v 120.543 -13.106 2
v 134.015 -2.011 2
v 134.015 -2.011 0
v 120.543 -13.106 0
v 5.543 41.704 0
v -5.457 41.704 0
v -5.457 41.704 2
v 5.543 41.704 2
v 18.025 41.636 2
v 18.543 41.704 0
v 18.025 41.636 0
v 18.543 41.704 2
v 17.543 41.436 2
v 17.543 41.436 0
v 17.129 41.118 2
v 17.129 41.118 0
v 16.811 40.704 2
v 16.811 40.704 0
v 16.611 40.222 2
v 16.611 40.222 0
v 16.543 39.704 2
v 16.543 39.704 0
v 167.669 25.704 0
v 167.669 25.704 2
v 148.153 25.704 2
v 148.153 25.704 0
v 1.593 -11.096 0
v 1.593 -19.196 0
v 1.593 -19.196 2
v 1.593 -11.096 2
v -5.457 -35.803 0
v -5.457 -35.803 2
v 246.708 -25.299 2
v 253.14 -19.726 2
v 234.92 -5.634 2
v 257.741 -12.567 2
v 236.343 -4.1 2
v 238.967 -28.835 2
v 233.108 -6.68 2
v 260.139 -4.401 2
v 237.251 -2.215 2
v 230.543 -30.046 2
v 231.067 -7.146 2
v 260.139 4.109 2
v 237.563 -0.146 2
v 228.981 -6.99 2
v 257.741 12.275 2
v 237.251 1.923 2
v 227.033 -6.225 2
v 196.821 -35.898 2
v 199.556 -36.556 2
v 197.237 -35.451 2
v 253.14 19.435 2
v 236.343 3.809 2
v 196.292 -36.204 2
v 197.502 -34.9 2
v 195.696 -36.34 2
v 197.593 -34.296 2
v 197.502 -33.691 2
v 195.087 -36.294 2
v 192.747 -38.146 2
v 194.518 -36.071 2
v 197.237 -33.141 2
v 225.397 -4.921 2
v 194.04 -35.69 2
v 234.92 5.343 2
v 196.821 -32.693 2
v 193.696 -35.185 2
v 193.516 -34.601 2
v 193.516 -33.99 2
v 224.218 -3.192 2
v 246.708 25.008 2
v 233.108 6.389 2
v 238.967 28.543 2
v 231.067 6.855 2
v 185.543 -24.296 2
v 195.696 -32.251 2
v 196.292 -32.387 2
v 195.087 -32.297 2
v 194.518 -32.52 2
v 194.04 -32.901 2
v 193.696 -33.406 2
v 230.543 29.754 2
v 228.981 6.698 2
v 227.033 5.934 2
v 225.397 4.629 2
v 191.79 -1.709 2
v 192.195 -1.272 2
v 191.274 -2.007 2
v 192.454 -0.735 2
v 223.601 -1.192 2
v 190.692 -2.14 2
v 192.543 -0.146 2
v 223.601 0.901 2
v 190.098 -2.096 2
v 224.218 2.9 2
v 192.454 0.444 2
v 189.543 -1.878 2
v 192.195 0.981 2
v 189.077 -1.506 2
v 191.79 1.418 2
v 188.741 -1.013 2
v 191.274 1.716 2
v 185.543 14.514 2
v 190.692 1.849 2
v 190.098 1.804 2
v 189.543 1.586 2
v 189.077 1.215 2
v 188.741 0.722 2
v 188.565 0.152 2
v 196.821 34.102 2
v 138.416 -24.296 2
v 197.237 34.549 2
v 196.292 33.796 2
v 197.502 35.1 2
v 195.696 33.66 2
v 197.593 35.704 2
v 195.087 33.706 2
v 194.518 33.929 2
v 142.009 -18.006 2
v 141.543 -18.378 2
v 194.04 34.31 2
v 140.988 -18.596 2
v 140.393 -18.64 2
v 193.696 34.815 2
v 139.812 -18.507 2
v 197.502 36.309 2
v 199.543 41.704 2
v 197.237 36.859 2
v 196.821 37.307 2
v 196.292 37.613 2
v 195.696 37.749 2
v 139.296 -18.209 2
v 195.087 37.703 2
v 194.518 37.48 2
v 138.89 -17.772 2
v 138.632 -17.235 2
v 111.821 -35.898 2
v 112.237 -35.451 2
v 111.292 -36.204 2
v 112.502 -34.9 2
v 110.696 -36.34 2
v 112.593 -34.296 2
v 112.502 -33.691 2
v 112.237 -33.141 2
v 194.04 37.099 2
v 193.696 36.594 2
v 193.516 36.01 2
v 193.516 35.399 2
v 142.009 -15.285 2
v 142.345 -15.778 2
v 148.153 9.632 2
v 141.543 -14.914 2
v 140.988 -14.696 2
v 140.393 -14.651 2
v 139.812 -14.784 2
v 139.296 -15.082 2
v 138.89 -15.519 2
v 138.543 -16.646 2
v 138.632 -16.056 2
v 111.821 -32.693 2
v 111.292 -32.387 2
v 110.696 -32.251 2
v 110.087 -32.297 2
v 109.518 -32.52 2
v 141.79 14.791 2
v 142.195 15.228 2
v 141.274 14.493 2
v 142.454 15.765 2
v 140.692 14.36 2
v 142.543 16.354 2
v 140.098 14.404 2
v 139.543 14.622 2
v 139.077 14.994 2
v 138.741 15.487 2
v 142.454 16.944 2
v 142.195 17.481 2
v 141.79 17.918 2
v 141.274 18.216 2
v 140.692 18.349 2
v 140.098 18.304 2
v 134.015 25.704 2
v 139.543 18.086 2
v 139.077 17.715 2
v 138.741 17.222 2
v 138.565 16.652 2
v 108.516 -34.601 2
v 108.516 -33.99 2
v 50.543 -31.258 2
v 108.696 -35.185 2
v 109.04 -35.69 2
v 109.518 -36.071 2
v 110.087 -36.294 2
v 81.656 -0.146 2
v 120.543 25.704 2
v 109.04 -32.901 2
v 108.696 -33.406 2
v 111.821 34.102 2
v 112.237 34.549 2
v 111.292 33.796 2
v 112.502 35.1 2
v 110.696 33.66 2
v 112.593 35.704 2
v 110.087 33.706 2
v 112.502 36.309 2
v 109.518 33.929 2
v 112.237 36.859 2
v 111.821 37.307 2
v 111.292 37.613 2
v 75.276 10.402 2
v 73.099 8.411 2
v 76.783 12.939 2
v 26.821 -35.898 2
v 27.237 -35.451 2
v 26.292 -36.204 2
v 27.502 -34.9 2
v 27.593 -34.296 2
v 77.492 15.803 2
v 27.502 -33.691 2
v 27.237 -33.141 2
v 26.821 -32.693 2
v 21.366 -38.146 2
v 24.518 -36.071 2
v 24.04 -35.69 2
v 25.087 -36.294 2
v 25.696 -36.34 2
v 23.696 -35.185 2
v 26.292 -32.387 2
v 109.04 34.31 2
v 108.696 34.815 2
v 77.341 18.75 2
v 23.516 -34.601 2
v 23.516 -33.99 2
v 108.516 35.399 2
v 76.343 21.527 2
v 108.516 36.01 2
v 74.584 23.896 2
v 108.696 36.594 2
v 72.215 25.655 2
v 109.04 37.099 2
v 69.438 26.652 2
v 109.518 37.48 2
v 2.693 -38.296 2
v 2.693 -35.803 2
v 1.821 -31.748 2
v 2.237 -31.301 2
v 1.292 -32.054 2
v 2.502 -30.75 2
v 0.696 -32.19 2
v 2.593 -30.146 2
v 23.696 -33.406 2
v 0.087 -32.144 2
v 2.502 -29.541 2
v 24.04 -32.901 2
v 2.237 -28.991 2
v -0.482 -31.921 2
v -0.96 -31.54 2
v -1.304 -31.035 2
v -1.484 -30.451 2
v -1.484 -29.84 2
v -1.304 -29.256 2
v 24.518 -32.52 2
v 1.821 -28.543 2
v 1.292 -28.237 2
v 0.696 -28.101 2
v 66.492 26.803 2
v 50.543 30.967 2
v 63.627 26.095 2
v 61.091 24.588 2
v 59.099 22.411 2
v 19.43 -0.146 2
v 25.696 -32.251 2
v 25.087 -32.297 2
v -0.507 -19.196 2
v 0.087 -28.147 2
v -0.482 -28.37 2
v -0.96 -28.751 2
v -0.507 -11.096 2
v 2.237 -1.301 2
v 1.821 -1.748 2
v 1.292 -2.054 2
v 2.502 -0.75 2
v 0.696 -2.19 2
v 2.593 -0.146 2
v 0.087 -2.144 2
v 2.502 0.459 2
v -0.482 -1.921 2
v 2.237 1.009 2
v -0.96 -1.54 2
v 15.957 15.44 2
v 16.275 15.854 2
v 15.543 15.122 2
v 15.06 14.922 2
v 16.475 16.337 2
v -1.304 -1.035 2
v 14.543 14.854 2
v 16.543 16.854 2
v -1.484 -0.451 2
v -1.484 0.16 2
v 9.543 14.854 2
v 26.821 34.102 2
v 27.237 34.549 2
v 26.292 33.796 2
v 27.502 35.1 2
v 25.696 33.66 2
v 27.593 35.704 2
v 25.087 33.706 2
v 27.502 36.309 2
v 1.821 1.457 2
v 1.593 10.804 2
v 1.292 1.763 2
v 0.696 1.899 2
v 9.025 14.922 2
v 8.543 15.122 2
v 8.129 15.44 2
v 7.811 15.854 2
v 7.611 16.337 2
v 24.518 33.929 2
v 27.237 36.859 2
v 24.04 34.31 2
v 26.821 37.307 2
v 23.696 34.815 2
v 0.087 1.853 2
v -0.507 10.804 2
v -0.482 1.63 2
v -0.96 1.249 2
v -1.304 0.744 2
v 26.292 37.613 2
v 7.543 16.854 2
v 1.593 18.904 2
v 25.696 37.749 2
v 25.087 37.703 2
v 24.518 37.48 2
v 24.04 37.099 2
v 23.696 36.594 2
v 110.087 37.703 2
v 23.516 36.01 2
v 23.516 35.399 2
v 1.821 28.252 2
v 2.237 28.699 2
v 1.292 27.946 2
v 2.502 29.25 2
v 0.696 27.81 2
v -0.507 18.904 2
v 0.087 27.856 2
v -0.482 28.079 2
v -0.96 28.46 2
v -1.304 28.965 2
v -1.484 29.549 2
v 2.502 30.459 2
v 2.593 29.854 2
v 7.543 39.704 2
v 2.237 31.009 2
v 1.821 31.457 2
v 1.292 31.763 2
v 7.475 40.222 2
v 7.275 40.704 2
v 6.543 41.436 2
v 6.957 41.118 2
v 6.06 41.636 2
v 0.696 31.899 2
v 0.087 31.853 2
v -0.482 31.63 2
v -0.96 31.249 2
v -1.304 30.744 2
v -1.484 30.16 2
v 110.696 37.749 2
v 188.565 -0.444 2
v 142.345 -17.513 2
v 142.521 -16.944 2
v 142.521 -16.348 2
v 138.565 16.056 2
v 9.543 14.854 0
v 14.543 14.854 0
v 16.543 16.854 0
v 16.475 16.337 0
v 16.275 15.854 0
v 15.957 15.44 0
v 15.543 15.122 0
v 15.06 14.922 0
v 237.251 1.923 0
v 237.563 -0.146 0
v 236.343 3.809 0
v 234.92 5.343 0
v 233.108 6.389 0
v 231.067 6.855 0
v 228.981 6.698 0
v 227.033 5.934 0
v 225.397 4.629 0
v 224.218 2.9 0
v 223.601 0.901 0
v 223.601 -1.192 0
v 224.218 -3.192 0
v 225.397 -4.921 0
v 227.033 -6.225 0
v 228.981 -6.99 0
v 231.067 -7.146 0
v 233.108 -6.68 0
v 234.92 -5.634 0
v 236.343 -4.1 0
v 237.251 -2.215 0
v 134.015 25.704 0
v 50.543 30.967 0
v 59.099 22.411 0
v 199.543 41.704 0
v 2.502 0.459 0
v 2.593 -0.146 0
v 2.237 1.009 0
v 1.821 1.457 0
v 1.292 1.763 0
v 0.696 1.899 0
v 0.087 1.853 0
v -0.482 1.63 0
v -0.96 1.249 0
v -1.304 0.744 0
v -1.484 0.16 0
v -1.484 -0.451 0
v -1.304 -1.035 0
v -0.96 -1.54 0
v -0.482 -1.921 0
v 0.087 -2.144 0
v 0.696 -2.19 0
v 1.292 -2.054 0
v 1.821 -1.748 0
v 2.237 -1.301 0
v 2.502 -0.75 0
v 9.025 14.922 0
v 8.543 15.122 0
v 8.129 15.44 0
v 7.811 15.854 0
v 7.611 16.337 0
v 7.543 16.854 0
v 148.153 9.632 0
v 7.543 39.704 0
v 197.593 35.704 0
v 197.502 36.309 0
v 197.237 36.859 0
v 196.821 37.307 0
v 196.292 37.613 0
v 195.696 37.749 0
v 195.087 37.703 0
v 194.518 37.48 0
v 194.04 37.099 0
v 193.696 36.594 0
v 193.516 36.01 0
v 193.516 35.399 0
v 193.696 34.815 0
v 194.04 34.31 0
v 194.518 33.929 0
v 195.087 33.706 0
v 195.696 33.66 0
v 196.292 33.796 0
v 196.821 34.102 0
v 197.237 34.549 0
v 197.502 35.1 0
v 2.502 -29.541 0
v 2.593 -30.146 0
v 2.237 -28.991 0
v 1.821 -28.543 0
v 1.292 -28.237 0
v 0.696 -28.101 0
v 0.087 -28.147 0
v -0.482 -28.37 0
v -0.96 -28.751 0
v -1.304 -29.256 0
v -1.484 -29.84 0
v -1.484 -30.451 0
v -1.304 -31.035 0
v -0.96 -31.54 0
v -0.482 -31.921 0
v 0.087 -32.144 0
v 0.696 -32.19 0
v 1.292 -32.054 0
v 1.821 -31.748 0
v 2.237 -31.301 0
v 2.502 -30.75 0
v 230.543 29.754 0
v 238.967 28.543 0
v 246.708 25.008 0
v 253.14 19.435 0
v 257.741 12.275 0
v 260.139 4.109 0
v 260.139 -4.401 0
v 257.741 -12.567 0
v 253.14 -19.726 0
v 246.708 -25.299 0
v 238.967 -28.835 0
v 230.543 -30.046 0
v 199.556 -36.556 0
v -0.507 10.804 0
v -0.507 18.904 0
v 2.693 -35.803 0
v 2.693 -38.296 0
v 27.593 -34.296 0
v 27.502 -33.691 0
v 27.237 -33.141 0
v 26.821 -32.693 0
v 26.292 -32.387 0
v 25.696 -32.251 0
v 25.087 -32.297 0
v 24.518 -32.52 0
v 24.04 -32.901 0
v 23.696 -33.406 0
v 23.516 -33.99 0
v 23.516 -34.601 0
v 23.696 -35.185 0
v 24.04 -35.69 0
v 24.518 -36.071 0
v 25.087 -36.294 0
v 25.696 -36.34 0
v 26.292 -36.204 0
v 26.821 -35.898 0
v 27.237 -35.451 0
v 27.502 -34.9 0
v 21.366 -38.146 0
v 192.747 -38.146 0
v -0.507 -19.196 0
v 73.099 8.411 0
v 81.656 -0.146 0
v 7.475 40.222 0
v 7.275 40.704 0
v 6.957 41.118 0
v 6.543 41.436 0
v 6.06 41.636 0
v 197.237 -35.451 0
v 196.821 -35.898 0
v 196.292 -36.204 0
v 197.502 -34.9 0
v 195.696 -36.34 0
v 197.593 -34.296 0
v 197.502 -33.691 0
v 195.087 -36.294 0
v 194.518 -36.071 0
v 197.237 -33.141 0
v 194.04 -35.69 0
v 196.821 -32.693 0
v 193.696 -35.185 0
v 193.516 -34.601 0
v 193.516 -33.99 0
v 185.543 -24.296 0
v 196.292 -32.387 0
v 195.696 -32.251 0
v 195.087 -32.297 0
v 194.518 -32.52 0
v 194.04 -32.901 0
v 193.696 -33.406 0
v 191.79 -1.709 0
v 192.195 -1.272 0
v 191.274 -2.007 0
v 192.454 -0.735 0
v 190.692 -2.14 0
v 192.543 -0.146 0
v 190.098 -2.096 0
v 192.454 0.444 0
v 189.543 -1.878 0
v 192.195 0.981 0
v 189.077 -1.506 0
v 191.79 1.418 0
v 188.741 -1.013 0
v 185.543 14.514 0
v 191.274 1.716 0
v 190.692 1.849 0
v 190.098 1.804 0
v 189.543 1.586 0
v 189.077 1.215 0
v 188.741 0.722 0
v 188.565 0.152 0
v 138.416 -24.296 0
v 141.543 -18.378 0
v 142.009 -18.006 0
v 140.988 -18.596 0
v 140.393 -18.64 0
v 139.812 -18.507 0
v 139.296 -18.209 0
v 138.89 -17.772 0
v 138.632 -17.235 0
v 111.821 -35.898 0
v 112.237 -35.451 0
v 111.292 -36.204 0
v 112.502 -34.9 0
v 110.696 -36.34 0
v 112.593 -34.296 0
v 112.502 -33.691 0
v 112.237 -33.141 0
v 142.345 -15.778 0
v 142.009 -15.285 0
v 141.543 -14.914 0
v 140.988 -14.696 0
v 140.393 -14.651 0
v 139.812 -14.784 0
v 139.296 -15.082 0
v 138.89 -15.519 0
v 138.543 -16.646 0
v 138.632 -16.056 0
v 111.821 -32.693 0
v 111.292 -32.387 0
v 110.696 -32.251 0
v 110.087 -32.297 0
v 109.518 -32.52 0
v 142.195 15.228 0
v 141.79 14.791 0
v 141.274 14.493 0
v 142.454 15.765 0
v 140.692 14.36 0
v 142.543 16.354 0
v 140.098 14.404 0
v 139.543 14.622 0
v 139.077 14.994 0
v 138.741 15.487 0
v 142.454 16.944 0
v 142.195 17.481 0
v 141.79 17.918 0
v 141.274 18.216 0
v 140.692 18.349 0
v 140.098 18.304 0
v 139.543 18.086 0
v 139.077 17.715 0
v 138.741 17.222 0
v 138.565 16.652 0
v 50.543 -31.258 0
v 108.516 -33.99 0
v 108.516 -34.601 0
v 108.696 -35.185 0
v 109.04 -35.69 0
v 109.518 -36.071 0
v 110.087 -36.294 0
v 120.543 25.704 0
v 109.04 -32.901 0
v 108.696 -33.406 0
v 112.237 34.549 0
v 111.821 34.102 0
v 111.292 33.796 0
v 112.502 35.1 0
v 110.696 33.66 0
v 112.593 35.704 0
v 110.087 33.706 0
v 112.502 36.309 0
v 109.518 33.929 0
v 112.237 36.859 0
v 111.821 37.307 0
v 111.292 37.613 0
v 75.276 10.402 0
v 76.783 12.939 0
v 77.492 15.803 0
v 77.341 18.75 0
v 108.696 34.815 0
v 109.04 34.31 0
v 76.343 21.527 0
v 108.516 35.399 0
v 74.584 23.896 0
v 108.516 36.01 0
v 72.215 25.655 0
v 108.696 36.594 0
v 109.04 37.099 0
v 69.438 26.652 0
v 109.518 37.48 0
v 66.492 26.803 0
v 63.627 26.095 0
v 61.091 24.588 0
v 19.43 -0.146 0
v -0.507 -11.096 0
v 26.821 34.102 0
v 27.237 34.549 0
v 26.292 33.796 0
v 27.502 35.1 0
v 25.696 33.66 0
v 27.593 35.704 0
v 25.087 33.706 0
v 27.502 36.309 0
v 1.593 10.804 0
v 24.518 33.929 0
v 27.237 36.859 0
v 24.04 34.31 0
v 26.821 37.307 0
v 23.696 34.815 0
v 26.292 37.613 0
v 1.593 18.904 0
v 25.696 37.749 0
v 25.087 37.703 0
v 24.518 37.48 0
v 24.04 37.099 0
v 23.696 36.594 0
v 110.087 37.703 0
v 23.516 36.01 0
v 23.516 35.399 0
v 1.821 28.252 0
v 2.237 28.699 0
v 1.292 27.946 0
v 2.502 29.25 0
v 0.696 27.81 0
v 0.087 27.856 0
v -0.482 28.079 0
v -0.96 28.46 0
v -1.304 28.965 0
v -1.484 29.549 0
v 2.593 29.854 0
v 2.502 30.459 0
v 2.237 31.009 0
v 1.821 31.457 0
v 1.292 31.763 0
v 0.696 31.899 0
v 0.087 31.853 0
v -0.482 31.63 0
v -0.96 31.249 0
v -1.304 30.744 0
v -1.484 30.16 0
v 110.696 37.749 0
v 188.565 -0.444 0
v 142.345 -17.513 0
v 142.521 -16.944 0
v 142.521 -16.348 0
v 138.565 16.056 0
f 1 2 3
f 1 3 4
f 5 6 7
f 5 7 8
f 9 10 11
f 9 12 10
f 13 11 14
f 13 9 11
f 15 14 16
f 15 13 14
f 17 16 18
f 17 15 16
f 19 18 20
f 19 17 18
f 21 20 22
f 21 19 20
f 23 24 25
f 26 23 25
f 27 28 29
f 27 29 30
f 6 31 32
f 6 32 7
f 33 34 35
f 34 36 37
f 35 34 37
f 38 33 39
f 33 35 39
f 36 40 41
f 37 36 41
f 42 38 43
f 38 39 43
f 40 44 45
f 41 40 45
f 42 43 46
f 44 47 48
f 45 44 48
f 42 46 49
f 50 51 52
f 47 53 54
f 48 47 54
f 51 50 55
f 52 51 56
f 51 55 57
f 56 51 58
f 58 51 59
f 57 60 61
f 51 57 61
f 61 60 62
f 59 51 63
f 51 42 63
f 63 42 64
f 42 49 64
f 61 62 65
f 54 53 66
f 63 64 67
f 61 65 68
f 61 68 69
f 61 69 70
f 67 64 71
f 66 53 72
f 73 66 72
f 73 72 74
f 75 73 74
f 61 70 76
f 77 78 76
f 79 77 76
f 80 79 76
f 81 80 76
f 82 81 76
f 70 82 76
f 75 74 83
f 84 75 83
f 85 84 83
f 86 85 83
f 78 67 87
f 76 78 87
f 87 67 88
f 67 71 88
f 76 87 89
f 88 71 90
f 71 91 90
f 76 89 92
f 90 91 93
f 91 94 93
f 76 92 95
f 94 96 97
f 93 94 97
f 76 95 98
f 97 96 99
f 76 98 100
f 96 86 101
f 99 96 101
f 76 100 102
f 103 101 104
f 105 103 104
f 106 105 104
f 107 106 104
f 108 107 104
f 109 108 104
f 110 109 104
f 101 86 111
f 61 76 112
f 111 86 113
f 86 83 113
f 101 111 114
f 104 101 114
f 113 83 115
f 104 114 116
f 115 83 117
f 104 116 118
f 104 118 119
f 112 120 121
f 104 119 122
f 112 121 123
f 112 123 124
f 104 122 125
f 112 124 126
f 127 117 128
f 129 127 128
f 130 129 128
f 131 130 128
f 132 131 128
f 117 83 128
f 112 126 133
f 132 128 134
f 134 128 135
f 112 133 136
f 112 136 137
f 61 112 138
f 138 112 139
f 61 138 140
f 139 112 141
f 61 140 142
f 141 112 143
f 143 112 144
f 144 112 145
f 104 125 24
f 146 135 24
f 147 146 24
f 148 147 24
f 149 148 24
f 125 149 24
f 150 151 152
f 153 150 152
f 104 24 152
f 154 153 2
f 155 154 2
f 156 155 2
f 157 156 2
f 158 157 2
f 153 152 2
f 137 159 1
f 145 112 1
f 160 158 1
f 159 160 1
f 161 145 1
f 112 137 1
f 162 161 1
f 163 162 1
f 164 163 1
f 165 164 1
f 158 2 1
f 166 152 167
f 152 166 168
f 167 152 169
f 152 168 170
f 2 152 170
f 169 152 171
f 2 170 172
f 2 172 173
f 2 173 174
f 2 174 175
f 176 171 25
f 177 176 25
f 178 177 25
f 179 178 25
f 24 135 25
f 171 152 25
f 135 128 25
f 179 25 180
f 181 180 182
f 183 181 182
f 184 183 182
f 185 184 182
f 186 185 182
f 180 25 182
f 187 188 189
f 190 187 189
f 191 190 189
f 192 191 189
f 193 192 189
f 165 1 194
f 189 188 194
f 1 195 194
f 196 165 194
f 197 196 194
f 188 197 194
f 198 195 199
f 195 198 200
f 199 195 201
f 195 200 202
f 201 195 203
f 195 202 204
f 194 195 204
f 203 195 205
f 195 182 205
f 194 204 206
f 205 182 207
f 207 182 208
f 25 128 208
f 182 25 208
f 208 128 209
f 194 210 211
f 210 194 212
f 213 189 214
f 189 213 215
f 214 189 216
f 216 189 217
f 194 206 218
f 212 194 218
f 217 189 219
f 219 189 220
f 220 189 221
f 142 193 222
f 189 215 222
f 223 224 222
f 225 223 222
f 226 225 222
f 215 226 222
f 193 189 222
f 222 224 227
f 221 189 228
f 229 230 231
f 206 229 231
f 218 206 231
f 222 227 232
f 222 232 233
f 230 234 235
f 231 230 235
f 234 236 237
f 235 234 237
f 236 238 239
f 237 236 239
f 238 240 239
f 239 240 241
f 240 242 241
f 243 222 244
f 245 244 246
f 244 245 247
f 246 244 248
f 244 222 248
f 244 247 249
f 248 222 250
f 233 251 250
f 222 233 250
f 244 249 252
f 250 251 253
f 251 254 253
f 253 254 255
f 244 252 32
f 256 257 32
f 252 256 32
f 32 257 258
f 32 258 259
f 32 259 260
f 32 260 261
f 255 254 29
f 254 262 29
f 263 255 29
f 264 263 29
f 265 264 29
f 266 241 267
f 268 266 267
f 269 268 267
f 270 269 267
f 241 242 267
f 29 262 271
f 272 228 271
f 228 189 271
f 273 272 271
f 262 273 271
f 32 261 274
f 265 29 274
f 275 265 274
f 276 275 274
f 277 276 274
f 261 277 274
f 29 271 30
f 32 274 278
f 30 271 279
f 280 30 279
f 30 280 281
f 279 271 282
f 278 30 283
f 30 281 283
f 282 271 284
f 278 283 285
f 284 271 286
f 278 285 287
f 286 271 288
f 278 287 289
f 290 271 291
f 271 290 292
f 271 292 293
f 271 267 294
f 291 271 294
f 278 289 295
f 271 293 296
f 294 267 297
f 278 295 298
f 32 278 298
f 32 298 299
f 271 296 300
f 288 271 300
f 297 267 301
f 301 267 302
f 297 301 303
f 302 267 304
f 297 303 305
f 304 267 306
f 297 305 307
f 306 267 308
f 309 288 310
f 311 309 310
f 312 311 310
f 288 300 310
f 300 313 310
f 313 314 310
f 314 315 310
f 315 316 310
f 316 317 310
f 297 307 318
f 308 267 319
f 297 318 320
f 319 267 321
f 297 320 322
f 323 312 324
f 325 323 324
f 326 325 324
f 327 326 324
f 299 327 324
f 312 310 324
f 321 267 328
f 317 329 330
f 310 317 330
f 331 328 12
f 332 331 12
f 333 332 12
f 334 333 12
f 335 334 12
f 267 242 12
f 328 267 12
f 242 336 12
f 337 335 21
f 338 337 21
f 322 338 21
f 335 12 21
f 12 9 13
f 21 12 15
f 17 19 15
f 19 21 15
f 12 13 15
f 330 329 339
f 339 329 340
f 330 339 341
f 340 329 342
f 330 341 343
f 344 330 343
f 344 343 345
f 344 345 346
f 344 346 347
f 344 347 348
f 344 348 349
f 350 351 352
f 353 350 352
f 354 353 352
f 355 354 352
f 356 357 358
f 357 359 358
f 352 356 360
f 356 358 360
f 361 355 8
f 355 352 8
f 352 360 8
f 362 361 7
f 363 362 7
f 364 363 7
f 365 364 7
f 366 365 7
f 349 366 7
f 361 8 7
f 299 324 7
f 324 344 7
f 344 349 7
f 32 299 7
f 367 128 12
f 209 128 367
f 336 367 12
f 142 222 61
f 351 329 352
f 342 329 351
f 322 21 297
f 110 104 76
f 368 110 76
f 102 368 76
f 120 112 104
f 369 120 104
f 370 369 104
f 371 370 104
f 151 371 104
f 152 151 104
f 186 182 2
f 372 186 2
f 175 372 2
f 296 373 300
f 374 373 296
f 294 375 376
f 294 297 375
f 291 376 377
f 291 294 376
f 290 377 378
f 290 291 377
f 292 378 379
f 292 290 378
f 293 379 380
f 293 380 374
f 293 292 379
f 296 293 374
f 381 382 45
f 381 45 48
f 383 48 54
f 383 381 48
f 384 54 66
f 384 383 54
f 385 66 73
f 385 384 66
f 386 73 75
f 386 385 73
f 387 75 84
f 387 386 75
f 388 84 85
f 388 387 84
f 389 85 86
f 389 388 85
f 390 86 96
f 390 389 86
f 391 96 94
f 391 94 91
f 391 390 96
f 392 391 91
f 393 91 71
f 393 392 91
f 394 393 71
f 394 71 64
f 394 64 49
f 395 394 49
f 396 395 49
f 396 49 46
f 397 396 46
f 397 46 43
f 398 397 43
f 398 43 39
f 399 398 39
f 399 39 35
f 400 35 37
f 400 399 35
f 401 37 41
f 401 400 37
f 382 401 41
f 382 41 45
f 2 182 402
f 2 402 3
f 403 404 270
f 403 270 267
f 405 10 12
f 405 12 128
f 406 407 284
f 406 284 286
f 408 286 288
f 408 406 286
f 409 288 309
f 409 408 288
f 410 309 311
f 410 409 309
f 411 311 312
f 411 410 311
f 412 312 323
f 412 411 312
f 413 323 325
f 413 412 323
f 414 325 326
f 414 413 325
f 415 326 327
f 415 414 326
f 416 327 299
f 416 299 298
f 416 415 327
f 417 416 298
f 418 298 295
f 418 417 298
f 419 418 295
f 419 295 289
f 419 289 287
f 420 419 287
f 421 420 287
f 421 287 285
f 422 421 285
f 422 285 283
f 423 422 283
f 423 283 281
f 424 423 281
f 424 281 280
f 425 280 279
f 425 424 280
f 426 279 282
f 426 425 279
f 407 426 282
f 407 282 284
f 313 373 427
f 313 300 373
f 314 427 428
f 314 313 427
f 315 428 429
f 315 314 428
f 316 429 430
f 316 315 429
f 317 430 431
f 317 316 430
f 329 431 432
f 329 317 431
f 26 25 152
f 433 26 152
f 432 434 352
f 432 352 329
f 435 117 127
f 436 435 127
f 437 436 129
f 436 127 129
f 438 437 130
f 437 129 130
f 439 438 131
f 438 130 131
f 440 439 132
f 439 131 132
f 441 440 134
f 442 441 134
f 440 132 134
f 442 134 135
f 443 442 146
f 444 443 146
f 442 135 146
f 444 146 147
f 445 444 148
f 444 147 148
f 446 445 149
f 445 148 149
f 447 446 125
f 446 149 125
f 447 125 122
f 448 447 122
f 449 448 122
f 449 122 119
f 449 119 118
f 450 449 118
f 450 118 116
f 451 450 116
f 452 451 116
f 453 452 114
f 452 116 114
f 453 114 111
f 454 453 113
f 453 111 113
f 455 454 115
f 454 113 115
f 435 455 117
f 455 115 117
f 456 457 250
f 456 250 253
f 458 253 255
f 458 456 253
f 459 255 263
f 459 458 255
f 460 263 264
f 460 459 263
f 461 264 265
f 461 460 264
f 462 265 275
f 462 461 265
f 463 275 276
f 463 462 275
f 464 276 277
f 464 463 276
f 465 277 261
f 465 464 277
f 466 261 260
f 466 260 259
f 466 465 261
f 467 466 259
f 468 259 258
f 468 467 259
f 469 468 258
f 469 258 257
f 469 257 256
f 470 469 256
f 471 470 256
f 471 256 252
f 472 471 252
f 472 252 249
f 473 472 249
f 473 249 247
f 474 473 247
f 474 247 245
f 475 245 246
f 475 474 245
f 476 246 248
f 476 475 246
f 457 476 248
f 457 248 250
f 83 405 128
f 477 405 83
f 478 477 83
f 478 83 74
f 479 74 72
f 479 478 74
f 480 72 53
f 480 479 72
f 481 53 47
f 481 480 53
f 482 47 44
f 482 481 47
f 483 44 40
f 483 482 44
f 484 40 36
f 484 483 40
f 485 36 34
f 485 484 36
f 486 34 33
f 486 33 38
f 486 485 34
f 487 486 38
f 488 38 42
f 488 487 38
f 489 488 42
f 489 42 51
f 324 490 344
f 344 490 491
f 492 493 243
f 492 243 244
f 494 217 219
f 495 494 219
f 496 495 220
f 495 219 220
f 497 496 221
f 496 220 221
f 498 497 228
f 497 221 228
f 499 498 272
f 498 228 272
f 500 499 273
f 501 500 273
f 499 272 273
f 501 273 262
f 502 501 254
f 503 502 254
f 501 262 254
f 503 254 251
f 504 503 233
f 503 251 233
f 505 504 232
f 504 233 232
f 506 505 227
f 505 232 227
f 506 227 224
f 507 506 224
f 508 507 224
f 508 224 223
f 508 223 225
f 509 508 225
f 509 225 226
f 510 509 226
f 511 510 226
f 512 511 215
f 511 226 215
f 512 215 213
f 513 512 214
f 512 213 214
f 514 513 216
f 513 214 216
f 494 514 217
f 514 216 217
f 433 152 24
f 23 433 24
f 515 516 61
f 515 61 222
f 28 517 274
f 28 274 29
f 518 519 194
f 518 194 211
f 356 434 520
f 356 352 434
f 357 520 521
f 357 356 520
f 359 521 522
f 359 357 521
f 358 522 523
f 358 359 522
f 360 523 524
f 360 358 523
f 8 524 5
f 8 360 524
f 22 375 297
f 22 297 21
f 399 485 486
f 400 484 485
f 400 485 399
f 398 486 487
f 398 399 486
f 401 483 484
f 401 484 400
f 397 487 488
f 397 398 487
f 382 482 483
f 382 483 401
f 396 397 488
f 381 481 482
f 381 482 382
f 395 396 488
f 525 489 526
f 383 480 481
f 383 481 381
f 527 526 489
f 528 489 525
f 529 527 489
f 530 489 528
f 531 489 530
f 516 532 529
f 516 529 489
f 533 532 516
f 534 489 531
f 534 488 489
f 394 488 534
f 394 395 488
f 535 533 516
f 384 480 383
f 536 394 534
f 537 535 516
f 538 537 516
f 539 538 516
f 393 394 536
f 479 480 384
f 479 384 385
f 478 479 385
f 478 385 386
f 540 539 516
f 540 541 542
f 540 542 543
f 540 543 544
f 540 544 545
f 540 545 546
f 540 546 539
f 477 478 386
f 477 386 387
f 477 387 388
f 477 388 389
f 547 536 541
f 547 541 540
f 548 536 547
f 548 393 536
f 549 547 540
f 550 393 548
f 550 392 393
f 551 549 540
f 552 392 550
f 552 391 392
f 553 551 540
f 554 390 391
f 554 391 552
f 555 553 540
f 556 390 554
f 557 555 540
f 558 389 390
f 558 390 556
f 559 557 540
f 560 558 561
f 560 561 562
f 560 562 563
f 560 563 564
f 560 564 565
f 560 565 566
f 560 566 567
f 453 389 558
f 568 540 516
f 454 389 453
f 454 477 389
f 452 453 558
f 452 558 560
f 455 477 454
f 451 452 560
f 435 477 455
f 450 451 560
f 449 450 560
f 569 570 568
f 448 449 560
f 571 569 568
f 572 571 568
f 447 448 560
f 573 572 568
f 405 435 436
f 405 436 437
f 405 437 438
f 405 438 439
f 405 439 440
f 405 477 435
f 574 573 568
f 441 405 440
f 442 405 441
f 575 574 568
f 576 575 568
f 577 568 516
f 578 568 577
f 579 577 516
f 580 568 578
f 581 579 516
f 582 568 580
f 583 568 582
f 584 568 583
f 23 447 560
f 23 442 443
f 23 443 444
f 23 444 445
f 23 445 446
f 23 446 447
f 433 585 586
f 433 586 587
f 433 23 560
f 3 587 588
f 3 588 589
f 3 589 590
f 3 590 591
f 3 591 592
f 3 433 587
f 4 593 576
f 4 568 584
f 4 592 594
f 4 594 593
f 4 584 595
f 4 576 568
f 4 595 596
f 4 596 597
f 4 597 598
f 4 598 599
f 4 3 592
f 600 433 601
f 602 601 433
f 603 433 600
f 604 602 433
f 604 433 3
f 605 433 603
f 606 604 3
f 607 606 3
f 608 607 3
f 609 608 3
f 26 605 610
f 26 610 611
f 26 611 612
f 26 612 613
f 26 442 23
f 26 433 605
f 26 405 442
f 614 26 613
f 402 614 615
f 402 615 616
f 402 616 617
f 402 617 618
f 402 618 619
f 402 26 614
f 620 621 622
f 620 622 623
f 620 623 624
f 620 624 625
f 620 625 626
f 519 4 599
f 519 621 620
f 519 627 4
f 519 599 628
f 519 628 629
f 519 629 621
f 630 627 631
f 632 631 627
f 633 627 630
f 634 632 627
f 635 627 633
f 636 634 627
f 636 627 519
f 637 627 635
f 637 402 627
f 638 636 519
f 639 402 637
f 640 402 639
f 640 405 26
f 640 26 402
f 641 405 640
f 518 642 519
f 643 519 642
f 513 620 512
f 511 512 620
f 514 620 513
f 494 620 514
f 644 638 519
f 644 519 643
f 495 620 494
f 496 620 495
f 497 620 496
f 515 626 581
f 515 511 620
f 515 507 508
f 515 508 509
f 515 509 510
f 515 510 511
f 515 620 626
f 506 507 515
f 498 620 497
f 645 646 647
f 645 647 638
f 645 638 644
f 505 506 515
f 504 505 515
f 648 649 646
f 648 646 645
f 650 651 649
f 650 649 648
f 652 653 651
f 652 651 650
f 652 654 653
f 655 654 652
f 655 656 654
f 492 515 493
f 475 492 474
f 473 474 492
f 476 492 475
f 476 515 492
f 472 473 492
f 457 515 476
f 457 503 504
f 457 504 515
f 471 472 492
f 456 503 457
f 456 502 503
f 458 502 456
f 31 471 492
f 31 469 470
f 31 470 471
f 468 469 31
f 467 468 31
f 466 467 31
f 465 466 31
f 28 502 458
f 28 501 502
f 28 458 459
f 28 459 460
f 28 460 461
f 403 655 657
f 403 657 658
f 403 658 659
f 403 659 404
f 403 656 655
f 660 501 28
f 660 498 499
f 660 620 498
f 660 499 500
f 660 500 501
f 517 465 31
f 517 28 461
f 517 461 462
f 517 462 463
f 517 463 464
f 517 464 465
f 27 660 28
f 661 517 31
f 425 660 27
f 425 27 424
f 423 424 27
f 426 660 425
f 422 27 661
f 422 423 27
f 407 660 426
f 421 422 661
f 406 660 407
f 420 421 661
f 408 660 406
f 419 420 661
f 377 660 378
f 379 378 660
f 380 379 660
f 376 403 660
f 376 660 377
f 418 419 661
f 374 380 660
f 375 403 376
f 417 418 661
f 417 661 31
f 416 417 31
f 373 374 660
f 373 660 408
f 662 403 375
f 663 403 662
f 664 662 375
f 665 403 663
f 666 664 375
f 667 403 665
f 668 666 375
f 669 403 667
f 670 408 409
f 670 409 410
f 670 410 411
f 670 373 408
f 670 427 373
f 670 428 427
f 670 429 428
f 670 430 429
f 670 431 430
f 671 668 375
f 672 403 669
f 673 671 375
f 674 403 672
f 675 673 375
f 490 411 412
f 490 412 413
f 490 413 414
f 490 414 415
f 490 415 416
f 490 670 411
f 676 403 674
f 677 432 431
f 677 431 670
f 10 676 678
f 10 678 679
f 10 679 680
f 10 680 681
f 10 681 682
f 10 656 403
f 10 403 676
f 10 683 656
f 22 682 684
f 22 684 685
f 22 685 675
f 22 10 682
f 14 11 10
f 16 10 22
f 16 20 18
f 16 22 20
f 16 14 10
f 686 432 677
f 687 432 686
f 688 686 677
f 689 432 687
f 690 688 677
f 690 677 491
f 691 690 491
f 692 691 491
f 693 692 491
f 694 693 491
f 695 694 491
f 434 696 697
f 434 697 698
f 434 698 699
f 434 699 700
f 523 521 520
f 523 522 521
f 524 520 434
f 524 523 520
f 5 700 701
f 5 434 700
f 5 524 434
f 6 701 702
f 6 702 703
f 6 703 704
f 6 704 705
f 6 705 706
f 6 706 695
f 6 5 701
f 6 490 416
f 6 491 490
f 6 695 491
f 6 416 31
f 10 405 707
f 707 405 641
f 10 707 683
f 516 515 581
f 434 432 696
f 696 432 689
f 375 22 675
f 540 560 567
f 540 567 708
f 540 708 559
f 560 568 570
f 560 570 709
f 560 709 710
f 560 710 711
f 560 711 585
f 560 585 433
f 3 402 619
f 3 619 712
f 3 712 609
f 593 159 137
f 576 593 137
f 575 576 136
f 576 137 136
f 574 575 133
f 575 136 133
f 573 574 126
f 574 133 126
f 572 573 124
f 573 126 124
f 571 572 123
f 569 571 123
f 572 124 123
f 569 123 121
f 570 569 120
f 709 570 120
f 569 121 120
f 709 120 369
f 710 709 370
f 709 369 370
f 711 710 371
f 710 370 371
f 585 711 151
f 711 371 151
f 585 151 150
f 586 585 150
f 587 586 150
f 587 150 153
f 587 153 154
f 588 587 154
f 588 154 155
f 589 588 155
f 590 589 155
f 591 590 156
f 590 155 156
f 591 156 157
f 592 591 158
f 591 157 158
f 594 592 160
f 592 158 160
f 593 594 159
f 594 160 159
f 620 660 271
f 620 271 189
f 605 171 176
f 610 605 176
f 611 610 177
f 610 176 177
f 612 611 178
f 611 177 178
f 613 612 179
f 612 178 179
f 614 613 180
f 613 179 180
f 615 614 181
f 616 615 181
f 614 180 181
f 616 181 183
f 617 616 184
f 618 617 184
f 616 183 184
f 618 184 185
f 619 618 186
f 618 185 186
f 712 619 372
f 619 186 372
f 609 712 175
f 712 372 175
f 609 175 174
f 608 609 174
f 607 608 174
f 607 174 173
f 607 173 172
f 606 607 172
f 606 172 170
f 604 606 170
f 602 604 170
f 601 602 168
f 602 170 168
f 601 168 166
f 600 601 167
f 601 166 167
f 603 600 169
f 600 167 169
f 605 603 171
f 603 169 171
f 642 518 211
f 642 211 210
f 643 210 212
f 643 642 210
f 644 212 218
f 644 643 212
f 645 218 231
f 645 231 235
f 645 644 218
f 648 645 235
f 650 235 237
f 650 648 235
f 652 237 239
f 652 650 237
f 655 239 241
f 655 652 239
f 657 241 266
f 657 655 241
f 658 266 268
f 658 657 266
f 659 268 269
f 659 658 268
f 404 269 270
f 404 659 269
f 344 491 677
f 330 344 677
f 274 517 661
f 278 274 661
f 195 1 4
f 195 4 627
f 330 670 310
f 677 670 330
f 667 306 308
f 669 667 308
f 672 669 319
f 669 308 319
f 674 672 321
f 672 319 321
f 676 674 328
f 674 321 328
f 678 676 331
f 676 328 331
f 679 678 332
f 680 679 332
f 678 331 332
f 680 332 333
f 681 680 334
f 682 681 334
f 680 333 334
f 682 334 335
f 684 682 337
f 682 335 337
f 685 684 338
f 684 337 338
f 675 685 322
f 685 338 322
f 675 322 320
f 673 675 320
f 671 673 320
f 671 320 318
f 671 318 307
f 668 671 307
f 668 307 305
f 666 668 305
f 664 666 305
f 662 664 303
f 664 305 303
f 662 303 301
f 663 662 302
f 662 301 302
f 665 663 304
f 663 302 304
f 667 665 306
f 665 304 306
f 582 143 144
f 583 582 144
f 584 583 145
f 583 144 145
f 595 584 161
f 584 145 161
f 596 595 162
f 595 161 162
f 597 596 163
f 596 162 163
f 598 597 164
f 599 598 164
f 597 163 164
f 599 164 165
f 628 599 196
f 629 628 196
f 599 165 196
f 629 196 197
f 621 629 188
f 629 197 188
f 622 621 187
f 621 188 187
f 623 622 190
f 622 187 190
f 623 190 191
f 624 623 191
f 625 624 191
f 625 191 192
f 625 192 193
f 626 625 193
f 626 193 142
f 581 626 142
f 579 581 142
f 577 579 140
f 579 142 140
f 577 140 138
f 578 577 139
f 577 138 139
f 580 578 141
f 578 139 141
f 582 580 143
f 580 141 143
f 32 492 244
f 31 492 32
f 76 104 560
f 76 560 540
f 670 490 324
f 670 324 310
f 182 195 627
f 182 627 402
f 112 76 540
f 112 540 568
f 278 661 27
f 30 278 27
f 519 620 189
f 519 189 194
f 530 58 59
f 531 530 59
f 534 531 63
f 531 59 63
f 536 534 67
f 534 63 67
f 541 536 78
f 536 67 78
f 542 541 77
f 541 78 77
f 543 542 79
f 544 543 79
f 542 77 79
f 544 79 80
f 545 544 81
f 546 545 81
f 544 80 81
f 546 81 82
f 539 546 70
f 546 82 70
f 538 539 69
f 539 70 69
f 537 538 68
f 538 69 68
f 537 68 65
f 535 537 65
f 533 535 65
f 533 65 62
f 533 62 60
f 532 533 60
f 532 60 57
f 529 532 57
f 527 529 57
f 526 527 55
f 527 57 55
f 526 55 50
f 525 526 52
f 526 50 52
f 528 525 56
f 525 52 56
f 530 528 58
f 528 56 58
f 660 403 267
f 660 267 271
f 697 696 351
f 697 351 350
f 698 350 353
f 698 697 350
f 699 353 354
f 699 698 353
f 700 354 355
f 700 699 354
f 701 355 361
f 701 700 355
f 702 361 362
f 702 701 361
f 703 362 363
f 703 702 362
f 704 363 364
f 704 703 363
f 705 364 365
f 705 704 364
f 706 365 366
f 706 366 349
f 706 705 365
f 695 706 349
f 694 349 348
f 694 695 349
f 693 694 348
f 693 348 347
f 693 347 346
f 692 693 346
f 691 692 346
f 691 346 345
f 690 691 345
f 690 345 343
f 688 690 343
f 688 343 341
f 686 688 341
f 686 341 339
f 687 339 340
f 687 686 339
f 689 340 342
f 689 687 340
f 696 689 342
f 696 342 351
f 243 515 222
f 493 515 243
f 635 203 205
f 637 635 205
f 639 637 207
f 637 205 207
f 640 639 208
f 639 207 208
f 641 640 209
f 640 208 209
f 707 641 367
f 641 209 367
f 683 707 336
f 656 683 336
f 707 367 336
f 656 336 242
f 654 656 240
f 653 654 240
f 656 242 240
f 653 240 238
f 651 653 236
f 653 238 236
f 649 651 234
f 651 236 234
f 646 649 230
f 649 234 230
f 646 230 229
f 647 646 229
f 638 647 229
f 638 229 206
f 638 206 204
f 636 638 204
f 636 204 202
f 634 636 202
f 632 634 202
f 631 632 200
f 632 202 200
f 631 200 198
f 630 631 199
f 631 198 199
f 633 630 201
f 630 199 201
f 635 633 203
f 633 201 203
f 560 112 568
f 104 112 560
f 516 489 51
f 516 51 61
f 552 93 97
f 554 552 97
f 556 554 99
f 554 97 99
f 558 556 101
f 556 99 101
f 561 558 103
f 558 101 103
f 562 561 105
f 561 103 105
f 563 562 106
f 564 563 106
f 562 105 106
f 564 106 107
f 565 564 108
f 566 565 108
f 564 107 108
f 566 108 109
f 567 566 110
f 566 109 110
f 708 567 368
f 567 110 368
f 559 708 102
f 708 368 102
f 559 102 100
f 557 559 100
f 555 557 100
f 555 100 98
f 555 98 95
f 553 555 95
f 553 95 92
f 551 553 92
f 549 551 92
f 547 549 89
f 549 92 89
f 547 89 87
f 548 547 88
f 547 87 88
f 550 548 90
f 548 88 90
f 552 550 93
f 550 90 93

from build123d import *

# Parameters (mm, degrees)
SKETCH_1_R          = 2.05
SKETCH_1_R_2        = 7.02
SKETCH_1_W          = 2.1
SKETCH_1_H          = 8.1
EXTRUDE_1_DEPTH     = 2
FILLET_1_R          = 2
SKETCH_3_R          = 2.05
SKETCH_3_R_2        = 2
CUT_EXTRUDE_1_DEPTH = 2


with BuildPart() as part:
    # 草图1 → 凸台-拉伸1 (new body)
    with BuildSketch(Plane.XY):
        with BuildLine():
            Line((230.542857143, -30.045714286), (199.556073527, -36.55591431))
            Line((199.556073527, -36.55591431), (192.746868021, -38.145714286))
            Line((192.746868021, -38.145714286), (21.365844759, -38.145714286))
            Line((21.365844759, -38.145714286), (2.692857143, -38.295714286))
            Line((2.692857143, -38.295714286), (2.692857143, -35.802553436))
            Line((2.692857143, -35.802553436), (-5.457142857, -35.802553436))
            Line((-5.457142857, -35.802553436), (-5.457142857, 41.704285714))
            Line((-5.457142857, 41.704285714), (7.542857143, 41.704285714))
            Line((7.542857143, 41.704285714), (7.542857143, 14.854285714))
            Line((7.542857143, 14.854285714), (16.542857143, 14.854285714))
            Line((16.542857143, 14.854285714), (16.542857143, 41.704285714))
            Line((16.542857143, 41.704285714), (199.542857143, 41.704285714))
            Line((199.542857143, 41.704285714), (230.542857143, 29.754285714))
            ThreePointArc((230.542857143, 29.754285714), (260.442857143, -0.145714286), (230.542857143, -30.045714286))
        make_face()
        with Locations((0.542857143, 29.854285714)):
            Circle(SKETCH_1_R, mode=Mode.SUBTRACT)
        with Locations((0.542857143, -0.145714286)):
            Circle(SKETCH_1_R, mode=Mode.SUBTRACT)
        with Locations((0.542857143, -30.145714286)):
            Circle(SKETCH_1_R, mode=Mode.SUBTRACT)
        with Locations((230.542857143, -0.145714286)):
            Circle(SKETCH_1_R_2, mode=Mode.SUBTRACT)
        with Locations((0.542857143, 14.854285714)):
            Rectangle(SKETCH_1_W, SKETCH_1_H, mode=Mode.SUBTRACT)
        with BuildLine():
            Line((59.099206329, 22.4106349), (50.542857143, 30.966984086))
            Line((50.542857143, 30.966984086), (19.430158771, -0.145714286))
            Line((19.430158771, -0.145714286), (50.542857143, -31.258412658))
            Line((50.542857143, -31.258412658), (81.655555515, -0.145714286))
            Line((81.655555515, -0.145714286), (73.099206329, 8.4106349))
            ThreePointArc((73.099206329, 8.4106349), (74.584487703, 23.895916275), (59.099206329, 22.4106349))
        make_face(mode=Mode.SUBTRACT)
        with Locations((0.542857143, -15.145714286)):
            Rectangle(SKETCH_1_W, SKETCH_1_H, mode=Mode.SUBTRACT)
    extrude(amount=EXTRUDE_1_DEPTH)

    # 圆角1
    fillet_1_edges = [part.edges().sort_by_distance(p)[0] for p in [
        (7.542857143, 41.704285714, 1),
        (7.542857143, 14.854285714, 1),
        (16.542857143, 14.854285714, 1),
        (16.542857143, 41.704285714, 1),
    ]]
    fillet(fillet_1_edges, radius=FILLET_1_R)

    # 草图3 → 切除-拉伸1 (cut)
    with BuildSketch(Plane.XY.offset(2)):
        with Locations((25.542857143, 35.704285714)):
            Circle(SKETCH_3_R)
        with Locations((110.542857143, 35.704285714)):
            Circle(SKETCH_3_R)
        with Locations((195.542857143, 35.704285714)):
            Circle(SKETCH_3_R)
        with Locations((110.542857143, -34.295714286)):
            Circle(SKETCH_3_R)
        with Locations((195.542857143, -34.295714286)):
            Circle(SKETCH_3_R)
        with Locations((25.542857143, -34.295714286)):
            Circle(SKETCH_3_R)
        with Locations((190.542857143, -0.145714286)):
            Circle(SKETCH_3_R_2)
        with Locations((140.542857143, 16.354285714)):
            Circle(SKETCH_3_R_2)
        with Locations(Location((140.542857143, -16.645714286, 0), (0, 0, 180))):
            Circle(SKETCH_3_R_2)
        Polygon((148.153334198, 25.704285714), (148.153334198, 9.632158315), (167.669488896, 25.704285714), align=None)
        Polygon((185.542857143, -24.295714286), (138.41622539, -24.295714286), (185.542857143, 14.51445304), align=None)
        Polygon((120.542857143, -13.105881612), (120.542857143, 25.704285714), (134.014872528, 25.704285714), (134.014872528, -2.011280706), align=None)
    extrude(amount=-CUT_EXTRUDE_1_DEPTH, mode=Mode.SUBTRACT)


solid = part.part
